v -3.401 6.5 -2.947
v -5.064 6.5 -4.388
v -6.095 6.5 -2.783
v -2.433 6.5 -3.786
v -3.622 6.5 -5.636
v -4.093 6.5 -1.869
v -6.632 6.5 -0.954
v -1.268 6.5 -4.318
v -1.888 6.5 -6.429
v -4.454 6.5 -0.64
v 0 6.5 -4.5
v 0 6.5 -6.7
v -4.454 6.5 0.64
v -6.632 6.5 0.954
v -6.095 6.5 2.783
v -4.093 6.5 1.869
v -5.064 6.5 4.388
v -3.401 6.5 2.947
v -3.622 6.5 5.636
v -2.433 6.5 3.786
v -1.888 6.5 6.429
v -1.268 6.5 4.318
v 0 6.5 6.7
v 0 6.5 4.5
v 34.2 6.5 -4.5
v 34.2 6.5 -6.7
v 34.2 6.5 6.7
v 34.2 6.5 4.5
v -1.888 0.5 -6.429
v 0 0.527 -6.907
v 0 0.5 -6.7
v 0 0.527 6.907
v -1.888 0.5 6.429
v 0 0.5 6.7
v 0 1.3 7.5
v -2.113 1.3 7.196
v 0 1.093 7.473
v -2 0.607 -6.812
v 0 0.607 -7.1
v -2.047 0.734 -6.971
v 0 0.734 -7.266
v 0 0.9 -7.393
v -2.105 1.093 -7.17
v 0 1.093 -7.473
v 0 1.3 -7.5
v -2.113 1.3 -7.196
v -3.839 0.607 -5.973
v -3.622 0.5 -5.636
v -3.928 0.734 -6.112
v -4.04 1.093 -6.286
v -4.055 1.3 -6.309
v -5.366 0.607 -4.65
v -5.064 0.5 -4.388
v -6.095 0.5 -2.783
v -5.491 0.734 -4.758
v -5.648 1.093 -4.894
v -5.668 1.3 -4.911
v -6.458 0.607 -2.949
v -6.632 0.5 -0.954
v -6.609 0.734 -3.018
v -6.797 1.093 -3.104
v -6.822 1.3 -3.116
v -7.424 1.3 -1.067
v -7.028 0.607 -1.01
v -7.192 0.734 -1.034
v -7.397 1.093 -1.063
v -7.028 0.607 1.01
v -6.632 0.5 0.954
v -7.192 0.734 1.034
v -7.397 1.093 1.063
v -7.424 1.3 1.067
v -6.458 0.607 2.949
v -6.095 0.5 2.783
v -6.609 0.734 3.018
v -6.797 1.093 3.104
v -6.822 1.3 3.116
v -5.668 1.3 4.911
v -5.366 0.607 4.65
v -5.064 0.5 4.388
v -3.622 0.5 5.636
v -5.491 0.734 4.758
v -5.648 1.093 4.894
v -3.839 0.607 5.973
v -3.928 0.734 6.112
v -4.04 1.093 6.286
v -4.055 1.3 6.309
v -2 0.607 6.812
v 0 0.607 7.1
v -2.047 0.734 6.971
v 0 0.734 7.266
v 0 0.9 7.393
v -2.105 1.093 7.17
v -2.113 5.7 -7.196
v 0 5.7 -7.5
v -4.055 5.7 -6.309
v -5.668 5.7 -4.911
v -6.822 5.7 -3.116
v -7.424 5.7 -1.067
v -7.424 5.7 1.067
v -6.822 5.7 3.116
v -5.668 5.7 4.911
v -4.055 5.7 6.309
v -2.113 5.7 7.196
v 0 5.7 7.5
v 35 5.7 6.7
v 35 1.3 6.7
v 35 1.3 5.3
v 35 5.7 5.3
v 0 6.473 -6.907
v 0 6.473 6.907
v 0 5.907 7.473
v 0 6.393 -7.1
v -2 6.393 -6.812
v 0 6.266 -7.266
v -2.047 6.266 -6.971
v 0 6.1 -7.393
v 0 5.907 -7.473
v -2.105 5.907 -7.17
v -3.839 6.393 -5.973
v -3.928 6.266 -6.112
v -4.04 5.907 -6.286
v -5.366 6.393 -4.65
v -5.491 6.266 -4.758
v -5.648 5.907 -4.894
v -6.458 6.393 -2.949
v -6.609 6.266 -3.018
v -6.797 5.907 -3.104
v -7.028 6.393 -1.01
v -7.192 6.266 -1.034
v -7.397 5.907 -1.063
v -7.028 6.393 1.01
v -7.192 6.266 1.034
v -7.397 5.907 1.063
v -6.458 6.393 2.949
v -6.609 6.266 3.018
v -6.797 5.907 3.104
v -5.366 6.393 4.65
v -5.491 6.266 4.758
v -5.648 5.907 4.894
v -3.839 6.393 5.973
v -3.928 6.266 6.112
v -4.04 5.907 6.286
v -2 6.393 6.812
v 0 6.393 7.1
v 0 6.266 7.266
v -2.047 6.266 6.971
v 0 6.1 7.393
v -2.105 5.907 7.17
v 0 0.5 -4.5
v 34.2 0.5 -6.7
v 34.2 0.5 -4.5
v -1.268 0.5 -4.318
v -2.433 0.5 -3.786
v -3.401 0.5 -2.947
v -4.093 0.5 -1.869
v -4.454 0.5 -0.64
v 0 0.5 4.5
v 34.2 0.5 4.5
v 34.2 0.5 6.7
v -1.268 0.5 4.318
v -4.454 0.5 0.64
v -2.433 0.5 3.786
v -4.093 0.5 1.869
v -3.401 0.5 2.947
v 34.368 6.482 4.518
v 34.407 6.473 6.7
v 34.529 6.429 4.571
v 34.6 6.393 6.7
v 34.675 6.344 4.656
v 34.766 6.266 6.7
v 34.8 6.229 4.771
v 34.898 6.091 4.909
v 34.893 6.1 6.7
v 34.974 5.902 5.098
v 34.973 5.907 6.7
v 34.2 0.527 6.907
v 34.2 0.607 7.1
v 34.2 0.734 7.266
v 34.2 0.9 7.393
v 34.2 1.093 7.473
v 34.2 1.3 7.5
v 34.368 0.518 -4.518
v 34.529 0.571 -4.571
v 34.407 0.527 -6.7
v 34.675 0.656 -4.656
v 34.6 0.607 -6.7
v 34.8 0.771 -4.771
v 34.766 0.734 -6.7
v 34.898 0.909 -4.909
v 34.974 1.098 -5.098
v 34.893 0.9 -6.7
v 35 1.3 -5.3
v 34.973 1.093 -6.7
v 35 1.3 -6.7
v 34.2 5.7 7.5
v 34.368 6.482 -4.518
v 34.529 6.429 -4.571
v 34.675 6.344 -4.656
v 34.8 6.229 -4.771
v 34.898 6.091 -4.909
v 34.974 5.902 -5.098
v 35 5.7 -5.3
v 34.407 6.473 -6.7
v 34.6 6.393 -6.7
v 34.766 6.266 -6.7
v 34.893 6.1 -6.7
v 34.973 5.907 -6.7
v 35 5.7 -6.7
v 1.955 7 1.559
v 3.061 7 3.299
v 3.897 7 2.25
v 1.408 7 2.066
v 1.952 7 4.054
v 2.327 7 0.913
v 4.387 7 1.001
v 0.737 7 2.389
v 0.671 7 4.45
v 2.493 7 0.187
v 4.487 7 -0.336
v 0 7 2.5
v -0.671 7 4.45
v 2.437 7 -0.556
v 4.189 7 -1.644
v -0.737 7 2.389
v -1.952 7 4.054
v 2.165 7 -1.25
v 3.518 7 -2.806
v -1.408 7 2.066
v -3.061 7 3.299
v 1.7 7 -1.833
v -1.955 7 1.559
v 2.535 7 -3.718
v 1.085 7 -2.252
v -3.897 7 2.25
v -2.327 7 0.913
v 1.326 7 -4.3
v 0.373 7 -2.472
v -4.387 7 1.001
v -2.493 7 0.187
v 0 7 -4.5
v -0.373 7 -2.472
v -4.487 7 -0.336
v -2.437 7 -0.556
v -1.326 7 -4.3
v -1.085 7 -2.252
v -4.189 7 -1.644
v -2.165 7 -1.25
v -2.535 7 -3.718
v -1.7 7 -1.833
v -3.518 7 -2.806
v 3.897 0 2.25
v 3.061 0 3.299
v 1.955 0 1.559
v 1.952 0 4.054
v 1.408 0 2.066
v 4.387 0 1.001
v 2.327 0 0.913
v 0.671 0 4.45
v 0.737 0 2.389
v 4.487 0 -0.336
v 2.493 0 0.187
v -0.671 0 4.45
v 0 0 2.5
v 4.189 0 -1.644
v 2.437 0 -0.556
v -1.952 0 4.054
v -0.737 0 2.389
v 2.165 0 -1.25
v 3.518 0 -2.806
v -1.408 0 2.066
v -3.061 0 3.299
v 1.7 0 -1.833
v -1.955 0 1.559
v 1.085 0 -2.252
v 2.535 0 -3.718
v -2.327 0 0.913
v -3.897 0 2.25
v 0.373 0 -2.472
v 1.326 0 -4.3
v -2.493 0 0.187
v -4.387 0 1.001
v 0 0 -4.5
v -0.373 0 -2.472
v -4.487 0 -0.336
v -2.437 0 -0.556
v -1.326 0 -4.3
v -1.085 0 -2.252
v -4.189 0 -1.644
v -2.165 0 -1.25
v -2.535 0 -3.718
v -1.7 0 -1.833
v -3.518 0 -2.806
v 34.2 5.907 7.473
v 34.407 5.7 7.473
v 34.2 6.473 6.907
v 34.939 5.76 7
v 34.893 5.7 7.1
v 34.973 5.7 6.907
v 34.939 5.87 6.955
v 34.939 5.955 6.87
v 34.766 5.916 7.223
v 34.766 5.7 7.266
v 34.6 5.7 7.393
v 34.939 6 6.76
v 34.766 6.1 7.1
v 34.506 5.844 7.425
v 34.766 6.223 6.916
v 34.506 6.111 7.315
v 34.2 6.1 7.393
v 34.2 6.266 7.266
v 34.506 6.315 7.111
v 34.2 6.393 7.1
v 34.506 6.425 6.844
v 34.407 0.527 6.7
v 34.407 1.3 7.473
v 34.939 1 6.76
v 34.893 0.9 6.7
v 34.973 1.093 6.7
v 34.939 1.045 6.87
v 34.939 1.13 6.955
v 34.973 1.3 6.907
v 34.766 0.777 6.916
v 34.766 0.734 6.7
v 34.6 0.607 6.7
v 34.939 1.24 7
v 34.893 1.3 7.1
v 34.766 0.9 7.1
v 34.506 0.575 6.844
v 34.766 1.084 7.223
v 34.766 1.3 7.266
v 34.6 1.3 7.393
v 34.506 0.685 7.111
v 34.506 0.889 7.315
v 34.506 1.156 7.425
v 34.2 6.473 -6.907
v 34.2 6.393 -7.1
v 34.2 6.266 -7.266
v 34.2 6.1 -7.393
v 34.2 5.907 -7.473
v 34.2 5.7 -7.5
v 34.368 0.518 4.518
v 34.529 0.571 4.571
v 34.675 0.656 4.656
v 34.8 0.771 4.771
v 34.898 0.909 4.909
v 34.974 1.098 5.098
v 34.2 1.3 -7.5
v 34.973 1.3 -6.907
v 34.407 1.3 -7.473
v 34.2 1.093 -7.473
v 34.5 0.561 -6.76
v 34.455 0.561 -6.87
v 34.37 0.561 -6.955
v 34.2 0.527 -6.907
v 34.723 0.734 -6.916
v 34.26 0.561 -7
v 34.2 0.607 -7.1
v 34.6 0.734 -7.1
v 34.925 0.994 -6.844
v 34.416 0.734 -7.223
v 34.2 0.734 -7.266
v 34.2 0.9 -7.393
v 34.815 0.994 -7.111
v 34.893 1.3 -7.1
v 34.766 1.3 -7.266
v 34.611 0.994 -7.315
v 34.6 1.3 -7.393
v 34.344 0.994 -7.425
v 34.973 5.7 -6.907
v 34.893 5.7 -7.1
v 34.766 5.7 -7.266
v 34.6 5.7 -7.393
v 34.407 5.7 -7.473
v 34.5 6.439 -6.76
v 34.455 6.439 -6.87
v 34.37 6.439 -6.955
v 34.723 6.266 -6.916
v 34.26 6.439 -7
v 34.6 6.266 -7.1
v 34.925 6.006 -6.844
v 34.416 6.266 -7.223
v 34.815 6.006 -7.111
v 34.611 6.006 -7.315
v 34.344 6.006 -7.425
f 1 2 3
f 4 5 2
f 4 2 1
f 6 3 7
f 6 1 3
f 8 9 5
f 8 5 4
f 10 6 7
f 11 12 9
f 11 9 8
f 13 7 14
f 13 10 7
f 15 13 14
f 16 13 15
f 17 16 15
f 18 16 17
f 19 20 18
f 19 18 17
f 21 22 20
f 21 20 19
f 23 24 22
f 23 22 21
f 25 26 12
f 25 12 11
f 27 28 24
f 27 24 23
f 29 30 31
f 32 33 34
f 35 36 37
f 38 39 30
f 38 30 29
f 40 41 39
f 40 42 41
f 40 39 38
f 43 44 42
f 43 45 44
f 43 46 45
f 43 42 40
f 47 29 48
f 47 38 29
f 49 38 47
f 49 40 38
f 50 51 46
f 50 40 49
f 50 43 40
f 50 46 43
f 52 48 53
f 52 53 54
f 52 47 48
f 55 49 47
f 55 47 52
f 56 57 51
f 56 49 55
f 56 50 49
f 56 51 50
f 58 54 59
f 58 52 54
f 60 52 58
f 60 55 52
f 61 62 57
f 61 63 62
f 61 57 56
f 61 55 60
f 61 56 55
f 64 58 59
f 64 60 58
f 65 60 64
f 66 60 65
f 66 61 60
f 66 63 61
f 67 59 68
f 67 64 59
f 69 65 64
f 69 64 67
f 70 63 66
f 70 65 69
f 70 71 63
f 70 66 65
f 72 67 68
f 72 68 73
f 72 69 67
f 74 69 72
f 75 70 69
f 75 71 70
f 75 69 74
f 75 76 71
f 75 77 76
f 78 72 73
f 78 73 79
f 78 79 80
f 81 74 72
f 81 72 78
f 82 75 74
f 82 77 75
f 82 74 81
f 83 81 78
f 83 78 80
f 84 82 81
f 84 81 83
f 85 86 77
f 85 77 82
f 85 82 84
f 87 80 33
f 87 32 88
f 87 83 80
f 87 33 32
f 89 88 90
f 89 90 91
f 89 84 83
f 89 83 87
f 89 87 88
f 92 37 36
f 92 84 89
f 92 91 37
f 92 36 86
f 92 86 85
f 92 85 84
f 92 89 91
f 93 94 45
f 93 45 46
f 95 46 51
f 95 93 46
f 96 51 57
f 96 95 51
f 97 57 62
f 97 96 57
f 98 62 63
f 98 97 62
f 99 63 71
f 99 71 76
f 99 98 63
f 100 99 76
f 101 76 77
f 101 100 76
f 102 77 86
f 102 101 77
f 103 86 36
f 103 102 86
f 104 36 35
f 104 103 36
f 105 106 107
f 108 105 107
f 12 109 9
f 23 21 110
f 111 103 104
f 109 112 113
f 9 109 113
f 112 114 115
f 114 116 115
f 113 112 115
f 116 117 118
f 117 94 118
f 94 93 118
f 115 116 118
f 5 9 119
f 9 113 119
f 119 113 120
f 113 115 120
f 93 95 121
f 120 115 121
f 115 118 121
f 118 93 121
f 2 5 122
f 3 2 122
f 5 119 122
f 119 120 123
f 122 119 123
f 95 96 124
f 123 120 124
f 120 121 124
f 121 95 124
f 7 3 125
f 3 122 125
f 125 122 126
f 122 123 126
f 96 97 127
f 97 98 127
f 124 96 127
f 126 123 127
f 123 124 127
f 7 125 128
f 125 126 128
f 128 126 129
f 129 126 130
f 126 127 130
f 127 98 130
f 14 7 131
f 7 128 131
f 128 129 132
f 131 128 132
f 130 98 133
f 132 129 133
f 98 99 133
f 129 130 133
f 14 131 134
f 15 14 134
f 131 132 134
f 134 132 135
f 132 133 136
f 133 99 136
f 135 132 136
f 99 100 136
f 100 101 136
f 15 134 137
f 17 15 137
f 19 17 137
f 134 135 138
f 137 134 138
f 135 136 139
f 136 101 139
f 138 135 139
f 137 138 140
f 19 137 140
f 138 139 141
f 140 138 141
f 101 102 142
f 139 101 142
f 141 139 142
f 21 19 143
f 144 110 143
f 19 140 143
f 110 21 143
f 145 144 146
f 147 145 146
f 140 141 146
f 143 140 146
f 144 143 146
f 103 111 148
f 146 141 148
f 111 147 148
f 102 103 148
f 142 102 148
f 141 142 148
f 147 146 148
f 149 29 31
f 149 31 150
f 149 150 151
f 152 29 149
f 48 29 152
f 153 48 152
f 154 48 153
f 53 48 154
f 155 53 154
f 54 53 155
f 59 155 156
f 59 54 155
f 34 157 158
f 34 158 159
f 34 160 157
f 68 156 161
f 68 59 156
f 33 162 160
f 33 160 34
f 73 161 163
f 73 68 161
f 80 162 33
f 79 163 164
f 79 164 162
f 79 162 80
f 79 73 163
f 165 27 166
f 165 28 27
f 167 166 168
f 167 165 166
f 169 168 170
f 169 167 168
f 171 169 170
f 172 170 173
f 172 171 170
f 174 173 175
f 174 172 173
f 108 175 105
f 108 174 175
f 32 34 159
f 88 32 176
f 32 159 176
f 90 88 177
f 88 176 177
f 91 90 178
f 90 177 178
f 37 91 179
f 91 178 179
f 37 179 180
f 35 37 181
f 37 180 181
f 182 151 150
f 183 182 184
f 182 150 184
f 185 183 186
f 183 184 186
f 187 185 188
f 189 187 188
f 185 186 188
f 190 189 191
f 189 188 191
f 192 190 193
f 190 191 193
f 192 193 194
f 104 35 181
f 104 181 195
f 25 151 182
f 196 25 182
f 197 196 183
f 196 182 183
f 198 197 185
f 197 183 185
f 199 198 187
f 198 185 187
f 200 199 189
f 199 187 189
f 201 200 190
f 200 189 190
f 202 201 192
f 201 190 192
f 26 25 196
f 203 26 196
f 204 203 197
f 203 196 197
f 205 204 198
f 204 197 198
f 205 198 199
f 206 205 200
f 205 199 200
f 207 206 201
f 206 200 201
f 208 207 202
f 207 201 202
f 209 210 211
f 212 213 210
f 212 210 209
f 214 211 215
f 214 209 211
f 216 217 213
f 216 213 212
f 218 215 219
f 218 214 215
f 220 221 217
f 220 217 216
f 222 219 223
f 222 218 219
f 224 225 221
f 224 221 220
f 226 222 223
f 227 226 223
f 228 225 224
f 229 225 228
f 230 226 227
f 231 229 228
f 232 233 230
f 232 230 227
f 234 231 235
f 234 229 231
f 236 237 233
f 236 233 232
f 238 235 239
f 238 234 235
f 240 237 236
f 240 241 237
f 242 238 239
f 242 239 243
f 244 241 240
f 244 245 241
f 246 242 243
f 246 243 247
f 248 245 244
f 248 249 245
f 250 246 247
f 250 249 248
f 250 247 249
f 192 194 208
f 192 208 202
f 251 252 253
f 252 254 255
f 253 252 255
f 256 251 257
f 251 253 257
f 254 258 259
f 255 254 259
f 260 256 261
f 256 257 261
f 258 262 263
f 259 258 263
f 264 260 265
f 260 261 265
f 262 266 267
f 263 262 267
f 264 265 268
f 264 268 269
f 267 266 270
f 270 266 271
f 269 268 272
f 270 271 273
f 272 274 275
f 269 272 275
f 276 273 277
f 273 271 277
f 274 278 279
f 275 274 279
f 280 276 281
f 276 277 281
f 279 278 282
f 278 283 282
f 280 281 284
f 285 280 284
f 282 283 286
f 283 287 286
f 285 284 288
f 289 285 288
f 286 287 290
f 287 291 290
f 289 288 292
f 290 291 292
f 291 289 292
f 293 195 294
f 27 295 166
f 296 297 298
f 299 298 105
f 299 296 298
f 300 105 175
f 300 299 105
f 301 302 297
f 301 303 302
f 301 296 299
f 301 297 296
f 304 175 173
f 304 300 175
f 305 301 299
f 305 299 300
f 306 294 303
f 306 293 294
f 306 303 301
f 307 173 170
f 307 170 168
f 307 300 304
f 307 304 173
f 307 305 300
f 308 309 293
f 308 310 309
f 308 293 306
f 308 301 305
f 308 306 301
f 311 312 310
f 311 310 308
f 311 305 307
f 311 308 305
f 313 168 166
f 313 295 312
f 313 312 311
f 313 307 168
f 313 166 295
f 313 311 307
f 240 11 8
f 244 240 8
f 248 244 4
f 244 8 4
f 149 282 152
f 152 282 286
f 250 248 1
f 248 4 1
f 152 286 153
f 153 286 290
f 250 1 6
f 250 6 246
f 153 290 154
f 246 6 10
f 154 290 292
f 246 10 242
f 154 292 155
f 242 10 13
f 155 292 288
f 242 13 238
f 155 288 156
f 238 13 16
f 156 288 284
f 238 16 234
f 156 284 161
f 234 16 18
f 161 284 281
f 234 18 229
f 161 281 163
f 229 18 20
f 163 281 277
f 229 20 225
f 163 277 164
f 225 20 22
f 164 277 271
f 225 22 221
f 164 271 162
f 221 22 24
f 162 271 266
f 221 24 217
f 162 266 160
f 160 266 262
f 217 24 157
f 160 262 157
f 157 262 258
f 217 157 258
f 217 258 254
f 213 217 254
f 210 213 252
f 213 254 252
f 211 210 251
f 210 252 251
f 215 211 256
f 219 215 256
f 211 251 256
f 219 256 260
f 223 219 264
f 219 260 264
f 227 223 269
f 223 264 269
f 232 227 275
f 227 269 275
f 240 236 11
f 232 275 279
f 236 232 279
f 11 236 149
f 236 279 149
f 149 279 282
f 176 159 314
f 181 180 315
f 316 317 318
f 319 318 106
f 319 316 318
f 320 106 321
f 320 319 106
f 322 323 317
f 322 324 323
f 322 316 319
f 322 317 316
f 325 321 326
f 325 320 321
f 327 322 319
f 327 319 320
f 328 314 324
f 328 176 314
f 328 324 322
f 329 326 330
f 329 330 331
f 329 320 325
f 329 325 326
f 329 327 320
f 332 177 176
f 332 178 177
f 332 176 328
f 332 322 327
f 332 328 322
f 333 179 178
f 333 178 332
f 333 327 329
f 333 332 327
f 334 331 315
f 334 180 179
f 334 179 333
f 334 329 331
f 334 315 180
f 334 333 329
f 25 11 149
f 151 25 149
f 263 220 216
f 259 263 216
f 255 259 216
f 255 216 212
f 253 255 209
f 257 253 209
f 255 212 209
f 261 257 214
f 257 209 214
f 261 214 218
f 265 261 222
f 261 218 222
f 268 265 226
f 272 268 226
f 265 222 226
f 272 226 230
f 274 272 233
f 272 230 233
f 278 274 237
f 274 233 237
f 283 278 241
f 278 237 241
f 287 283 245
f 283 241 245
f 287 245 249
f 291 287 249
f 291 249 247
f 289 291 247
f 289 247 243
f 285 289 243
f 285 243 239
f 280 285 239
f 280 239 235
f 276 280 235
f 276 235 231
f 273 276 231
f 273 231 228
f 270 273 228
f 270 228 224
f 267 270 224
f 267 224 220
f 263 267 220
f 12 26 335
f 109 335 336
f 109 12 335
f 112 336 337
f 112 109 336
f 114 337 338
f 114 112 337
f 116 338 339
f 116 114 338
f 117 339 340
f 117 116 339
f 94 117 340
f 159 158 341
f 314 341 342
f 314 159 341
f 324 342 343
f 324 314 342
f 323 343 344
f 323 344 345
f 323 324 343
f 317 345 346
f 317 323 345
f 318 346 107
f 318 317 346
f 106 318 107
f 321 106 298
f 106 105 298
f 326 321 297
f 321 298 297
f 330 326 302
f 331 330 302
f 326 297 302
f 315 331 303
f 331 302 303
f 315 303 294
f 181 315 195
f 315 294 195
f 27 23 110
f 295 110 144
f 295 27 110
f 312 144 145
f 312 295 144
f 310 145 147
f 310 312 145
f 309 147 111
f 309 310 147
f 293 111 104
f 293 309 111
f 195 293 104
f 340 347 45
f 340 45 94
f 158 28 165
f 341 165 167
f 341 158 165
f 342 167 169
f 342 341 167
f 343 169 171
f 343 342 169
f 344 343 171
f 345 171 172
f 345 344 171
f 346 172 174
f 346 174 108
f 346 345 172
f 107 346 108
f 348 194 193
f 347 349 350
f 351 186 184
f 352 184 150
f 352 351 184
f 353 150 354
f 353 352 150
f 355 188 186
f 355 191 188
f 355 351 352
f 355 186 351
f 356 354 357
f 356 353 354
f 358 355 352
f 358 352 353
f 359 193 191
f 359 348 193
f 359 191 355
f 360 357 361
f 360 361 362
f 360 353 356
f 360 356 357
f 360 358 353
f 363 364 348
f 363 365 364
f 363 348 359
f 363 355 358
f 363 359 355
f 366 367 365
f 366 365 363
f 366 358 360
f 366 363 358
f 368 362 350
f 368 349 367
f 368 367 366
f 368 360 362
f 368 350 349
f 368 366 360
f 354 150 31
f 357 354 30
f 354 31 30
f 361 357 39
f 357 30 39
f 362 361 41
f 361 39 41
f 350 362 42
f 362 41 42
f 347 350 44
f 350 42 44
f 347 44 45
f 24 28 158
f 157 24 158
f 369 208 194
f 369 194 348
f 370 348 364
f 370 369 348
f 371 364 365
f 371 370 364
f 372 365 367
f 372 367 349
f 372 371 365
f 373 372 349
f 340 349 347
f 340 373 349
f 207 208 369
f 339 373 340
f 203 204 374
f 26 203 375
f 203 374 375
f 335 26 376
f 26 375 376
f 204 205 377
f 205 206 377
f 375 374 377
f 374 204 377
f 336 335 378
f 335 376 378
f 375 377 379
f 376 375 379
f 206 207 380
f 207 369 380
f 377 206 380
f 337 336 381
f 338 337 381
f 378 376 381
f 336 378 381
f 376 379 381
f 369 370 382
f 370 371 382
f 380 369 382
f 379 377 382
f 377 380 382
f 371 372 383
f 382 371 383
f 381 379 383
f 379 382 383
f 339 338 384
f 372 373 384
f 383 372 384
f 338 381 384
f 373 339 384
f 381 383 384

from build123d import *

# Parameters (mm, degrees)
SKETCH1_R           = 4.5
BOSS_EXTRUDE1_DEPTH = 7
SKETCH2_R           = 2.5
CUT_EXTRUDE1_DEPTH  = 10.460443964
SKETCH4_W           = 3
SKETCH4_H           = 6
FILLET1_R           = 0.8


with BuildPart() as part:
    # Sketch1 → Boss-Extrude1 (new body)
    with BuildSketch(Plane(origin=(0, 0, 0), x_dir=(1, 0, 0), z_dir=(0, 1, 0))):
        with Locations(Location((0, 0, 0), (0, 0, 90))):
            Circle(SKETCH1_R)
    extrude(amount=BOSS_EXTRUDE1_DEPTH)

    # Sketch2 → Cut-Extrude1 (cut, through all)
    with BuildSketch(Plane(origin=(0, 7, 0), x_dir=(1, 0, 0), z_dir=(0, 1, 0))):
        with Locations(Location((0, 0, 0), (0, 0, 270))):
            Circle(SKETCH2_R)
    extrude(amount=-CUT_EXTRUDE1_DEPTH, mode=Mode.SUBTRACT)

    # Sweep1: sweep along a path in Sketch3
    with BuildLine(Plane(origin=(0, 3.5, 0), x_dir=(1, 0, 0), z_dir=(0, 1, 0))) as sweep1_path:
        Line((35, 6), (0, 6))
        ThreePointArc((0, 6), (-6, 0), (0, -6))
        Line((0, -6), (35, -6))
    # Sketch4 → Sweep1 (sweep)
    with BuildSketch(Plane(origin=(35, 0, 0), x_dir=(0, 0, -1), z_dir=(1, 0, 0))):
        with Locations((6, 3.5)):
            Rectangle(SKETCH4_W, SKETCH4_H)
    sweep(path=sweep1_path.line)

    # Fillet1
    fillet1_edges = [part.edges().sort_by_distance(p)[0] for p in [
        (35, 3.5, -7.5),
        (35, 6.5, -6),
        (35, 3.5, -4.5),
        (35, 0.5, -6),
        (35, 3.5, 4.5),
        (17.5, 0.5, 7.5),
        (35, 0.5, 6),
        (17.5, 6.5, 7.5),
        (35, 3.5, 7.5),
        (35, 6.5, 6),
        (-7.5, 0.5, 0),
        (-7.5, 6.5, 0),
        (17.5, 0.5, -7.5),
        (17.5, 6.5, -7.5),
    ]]
    fillet(fillet1_edges, radius=FILLET1_R)


solid = part.part
